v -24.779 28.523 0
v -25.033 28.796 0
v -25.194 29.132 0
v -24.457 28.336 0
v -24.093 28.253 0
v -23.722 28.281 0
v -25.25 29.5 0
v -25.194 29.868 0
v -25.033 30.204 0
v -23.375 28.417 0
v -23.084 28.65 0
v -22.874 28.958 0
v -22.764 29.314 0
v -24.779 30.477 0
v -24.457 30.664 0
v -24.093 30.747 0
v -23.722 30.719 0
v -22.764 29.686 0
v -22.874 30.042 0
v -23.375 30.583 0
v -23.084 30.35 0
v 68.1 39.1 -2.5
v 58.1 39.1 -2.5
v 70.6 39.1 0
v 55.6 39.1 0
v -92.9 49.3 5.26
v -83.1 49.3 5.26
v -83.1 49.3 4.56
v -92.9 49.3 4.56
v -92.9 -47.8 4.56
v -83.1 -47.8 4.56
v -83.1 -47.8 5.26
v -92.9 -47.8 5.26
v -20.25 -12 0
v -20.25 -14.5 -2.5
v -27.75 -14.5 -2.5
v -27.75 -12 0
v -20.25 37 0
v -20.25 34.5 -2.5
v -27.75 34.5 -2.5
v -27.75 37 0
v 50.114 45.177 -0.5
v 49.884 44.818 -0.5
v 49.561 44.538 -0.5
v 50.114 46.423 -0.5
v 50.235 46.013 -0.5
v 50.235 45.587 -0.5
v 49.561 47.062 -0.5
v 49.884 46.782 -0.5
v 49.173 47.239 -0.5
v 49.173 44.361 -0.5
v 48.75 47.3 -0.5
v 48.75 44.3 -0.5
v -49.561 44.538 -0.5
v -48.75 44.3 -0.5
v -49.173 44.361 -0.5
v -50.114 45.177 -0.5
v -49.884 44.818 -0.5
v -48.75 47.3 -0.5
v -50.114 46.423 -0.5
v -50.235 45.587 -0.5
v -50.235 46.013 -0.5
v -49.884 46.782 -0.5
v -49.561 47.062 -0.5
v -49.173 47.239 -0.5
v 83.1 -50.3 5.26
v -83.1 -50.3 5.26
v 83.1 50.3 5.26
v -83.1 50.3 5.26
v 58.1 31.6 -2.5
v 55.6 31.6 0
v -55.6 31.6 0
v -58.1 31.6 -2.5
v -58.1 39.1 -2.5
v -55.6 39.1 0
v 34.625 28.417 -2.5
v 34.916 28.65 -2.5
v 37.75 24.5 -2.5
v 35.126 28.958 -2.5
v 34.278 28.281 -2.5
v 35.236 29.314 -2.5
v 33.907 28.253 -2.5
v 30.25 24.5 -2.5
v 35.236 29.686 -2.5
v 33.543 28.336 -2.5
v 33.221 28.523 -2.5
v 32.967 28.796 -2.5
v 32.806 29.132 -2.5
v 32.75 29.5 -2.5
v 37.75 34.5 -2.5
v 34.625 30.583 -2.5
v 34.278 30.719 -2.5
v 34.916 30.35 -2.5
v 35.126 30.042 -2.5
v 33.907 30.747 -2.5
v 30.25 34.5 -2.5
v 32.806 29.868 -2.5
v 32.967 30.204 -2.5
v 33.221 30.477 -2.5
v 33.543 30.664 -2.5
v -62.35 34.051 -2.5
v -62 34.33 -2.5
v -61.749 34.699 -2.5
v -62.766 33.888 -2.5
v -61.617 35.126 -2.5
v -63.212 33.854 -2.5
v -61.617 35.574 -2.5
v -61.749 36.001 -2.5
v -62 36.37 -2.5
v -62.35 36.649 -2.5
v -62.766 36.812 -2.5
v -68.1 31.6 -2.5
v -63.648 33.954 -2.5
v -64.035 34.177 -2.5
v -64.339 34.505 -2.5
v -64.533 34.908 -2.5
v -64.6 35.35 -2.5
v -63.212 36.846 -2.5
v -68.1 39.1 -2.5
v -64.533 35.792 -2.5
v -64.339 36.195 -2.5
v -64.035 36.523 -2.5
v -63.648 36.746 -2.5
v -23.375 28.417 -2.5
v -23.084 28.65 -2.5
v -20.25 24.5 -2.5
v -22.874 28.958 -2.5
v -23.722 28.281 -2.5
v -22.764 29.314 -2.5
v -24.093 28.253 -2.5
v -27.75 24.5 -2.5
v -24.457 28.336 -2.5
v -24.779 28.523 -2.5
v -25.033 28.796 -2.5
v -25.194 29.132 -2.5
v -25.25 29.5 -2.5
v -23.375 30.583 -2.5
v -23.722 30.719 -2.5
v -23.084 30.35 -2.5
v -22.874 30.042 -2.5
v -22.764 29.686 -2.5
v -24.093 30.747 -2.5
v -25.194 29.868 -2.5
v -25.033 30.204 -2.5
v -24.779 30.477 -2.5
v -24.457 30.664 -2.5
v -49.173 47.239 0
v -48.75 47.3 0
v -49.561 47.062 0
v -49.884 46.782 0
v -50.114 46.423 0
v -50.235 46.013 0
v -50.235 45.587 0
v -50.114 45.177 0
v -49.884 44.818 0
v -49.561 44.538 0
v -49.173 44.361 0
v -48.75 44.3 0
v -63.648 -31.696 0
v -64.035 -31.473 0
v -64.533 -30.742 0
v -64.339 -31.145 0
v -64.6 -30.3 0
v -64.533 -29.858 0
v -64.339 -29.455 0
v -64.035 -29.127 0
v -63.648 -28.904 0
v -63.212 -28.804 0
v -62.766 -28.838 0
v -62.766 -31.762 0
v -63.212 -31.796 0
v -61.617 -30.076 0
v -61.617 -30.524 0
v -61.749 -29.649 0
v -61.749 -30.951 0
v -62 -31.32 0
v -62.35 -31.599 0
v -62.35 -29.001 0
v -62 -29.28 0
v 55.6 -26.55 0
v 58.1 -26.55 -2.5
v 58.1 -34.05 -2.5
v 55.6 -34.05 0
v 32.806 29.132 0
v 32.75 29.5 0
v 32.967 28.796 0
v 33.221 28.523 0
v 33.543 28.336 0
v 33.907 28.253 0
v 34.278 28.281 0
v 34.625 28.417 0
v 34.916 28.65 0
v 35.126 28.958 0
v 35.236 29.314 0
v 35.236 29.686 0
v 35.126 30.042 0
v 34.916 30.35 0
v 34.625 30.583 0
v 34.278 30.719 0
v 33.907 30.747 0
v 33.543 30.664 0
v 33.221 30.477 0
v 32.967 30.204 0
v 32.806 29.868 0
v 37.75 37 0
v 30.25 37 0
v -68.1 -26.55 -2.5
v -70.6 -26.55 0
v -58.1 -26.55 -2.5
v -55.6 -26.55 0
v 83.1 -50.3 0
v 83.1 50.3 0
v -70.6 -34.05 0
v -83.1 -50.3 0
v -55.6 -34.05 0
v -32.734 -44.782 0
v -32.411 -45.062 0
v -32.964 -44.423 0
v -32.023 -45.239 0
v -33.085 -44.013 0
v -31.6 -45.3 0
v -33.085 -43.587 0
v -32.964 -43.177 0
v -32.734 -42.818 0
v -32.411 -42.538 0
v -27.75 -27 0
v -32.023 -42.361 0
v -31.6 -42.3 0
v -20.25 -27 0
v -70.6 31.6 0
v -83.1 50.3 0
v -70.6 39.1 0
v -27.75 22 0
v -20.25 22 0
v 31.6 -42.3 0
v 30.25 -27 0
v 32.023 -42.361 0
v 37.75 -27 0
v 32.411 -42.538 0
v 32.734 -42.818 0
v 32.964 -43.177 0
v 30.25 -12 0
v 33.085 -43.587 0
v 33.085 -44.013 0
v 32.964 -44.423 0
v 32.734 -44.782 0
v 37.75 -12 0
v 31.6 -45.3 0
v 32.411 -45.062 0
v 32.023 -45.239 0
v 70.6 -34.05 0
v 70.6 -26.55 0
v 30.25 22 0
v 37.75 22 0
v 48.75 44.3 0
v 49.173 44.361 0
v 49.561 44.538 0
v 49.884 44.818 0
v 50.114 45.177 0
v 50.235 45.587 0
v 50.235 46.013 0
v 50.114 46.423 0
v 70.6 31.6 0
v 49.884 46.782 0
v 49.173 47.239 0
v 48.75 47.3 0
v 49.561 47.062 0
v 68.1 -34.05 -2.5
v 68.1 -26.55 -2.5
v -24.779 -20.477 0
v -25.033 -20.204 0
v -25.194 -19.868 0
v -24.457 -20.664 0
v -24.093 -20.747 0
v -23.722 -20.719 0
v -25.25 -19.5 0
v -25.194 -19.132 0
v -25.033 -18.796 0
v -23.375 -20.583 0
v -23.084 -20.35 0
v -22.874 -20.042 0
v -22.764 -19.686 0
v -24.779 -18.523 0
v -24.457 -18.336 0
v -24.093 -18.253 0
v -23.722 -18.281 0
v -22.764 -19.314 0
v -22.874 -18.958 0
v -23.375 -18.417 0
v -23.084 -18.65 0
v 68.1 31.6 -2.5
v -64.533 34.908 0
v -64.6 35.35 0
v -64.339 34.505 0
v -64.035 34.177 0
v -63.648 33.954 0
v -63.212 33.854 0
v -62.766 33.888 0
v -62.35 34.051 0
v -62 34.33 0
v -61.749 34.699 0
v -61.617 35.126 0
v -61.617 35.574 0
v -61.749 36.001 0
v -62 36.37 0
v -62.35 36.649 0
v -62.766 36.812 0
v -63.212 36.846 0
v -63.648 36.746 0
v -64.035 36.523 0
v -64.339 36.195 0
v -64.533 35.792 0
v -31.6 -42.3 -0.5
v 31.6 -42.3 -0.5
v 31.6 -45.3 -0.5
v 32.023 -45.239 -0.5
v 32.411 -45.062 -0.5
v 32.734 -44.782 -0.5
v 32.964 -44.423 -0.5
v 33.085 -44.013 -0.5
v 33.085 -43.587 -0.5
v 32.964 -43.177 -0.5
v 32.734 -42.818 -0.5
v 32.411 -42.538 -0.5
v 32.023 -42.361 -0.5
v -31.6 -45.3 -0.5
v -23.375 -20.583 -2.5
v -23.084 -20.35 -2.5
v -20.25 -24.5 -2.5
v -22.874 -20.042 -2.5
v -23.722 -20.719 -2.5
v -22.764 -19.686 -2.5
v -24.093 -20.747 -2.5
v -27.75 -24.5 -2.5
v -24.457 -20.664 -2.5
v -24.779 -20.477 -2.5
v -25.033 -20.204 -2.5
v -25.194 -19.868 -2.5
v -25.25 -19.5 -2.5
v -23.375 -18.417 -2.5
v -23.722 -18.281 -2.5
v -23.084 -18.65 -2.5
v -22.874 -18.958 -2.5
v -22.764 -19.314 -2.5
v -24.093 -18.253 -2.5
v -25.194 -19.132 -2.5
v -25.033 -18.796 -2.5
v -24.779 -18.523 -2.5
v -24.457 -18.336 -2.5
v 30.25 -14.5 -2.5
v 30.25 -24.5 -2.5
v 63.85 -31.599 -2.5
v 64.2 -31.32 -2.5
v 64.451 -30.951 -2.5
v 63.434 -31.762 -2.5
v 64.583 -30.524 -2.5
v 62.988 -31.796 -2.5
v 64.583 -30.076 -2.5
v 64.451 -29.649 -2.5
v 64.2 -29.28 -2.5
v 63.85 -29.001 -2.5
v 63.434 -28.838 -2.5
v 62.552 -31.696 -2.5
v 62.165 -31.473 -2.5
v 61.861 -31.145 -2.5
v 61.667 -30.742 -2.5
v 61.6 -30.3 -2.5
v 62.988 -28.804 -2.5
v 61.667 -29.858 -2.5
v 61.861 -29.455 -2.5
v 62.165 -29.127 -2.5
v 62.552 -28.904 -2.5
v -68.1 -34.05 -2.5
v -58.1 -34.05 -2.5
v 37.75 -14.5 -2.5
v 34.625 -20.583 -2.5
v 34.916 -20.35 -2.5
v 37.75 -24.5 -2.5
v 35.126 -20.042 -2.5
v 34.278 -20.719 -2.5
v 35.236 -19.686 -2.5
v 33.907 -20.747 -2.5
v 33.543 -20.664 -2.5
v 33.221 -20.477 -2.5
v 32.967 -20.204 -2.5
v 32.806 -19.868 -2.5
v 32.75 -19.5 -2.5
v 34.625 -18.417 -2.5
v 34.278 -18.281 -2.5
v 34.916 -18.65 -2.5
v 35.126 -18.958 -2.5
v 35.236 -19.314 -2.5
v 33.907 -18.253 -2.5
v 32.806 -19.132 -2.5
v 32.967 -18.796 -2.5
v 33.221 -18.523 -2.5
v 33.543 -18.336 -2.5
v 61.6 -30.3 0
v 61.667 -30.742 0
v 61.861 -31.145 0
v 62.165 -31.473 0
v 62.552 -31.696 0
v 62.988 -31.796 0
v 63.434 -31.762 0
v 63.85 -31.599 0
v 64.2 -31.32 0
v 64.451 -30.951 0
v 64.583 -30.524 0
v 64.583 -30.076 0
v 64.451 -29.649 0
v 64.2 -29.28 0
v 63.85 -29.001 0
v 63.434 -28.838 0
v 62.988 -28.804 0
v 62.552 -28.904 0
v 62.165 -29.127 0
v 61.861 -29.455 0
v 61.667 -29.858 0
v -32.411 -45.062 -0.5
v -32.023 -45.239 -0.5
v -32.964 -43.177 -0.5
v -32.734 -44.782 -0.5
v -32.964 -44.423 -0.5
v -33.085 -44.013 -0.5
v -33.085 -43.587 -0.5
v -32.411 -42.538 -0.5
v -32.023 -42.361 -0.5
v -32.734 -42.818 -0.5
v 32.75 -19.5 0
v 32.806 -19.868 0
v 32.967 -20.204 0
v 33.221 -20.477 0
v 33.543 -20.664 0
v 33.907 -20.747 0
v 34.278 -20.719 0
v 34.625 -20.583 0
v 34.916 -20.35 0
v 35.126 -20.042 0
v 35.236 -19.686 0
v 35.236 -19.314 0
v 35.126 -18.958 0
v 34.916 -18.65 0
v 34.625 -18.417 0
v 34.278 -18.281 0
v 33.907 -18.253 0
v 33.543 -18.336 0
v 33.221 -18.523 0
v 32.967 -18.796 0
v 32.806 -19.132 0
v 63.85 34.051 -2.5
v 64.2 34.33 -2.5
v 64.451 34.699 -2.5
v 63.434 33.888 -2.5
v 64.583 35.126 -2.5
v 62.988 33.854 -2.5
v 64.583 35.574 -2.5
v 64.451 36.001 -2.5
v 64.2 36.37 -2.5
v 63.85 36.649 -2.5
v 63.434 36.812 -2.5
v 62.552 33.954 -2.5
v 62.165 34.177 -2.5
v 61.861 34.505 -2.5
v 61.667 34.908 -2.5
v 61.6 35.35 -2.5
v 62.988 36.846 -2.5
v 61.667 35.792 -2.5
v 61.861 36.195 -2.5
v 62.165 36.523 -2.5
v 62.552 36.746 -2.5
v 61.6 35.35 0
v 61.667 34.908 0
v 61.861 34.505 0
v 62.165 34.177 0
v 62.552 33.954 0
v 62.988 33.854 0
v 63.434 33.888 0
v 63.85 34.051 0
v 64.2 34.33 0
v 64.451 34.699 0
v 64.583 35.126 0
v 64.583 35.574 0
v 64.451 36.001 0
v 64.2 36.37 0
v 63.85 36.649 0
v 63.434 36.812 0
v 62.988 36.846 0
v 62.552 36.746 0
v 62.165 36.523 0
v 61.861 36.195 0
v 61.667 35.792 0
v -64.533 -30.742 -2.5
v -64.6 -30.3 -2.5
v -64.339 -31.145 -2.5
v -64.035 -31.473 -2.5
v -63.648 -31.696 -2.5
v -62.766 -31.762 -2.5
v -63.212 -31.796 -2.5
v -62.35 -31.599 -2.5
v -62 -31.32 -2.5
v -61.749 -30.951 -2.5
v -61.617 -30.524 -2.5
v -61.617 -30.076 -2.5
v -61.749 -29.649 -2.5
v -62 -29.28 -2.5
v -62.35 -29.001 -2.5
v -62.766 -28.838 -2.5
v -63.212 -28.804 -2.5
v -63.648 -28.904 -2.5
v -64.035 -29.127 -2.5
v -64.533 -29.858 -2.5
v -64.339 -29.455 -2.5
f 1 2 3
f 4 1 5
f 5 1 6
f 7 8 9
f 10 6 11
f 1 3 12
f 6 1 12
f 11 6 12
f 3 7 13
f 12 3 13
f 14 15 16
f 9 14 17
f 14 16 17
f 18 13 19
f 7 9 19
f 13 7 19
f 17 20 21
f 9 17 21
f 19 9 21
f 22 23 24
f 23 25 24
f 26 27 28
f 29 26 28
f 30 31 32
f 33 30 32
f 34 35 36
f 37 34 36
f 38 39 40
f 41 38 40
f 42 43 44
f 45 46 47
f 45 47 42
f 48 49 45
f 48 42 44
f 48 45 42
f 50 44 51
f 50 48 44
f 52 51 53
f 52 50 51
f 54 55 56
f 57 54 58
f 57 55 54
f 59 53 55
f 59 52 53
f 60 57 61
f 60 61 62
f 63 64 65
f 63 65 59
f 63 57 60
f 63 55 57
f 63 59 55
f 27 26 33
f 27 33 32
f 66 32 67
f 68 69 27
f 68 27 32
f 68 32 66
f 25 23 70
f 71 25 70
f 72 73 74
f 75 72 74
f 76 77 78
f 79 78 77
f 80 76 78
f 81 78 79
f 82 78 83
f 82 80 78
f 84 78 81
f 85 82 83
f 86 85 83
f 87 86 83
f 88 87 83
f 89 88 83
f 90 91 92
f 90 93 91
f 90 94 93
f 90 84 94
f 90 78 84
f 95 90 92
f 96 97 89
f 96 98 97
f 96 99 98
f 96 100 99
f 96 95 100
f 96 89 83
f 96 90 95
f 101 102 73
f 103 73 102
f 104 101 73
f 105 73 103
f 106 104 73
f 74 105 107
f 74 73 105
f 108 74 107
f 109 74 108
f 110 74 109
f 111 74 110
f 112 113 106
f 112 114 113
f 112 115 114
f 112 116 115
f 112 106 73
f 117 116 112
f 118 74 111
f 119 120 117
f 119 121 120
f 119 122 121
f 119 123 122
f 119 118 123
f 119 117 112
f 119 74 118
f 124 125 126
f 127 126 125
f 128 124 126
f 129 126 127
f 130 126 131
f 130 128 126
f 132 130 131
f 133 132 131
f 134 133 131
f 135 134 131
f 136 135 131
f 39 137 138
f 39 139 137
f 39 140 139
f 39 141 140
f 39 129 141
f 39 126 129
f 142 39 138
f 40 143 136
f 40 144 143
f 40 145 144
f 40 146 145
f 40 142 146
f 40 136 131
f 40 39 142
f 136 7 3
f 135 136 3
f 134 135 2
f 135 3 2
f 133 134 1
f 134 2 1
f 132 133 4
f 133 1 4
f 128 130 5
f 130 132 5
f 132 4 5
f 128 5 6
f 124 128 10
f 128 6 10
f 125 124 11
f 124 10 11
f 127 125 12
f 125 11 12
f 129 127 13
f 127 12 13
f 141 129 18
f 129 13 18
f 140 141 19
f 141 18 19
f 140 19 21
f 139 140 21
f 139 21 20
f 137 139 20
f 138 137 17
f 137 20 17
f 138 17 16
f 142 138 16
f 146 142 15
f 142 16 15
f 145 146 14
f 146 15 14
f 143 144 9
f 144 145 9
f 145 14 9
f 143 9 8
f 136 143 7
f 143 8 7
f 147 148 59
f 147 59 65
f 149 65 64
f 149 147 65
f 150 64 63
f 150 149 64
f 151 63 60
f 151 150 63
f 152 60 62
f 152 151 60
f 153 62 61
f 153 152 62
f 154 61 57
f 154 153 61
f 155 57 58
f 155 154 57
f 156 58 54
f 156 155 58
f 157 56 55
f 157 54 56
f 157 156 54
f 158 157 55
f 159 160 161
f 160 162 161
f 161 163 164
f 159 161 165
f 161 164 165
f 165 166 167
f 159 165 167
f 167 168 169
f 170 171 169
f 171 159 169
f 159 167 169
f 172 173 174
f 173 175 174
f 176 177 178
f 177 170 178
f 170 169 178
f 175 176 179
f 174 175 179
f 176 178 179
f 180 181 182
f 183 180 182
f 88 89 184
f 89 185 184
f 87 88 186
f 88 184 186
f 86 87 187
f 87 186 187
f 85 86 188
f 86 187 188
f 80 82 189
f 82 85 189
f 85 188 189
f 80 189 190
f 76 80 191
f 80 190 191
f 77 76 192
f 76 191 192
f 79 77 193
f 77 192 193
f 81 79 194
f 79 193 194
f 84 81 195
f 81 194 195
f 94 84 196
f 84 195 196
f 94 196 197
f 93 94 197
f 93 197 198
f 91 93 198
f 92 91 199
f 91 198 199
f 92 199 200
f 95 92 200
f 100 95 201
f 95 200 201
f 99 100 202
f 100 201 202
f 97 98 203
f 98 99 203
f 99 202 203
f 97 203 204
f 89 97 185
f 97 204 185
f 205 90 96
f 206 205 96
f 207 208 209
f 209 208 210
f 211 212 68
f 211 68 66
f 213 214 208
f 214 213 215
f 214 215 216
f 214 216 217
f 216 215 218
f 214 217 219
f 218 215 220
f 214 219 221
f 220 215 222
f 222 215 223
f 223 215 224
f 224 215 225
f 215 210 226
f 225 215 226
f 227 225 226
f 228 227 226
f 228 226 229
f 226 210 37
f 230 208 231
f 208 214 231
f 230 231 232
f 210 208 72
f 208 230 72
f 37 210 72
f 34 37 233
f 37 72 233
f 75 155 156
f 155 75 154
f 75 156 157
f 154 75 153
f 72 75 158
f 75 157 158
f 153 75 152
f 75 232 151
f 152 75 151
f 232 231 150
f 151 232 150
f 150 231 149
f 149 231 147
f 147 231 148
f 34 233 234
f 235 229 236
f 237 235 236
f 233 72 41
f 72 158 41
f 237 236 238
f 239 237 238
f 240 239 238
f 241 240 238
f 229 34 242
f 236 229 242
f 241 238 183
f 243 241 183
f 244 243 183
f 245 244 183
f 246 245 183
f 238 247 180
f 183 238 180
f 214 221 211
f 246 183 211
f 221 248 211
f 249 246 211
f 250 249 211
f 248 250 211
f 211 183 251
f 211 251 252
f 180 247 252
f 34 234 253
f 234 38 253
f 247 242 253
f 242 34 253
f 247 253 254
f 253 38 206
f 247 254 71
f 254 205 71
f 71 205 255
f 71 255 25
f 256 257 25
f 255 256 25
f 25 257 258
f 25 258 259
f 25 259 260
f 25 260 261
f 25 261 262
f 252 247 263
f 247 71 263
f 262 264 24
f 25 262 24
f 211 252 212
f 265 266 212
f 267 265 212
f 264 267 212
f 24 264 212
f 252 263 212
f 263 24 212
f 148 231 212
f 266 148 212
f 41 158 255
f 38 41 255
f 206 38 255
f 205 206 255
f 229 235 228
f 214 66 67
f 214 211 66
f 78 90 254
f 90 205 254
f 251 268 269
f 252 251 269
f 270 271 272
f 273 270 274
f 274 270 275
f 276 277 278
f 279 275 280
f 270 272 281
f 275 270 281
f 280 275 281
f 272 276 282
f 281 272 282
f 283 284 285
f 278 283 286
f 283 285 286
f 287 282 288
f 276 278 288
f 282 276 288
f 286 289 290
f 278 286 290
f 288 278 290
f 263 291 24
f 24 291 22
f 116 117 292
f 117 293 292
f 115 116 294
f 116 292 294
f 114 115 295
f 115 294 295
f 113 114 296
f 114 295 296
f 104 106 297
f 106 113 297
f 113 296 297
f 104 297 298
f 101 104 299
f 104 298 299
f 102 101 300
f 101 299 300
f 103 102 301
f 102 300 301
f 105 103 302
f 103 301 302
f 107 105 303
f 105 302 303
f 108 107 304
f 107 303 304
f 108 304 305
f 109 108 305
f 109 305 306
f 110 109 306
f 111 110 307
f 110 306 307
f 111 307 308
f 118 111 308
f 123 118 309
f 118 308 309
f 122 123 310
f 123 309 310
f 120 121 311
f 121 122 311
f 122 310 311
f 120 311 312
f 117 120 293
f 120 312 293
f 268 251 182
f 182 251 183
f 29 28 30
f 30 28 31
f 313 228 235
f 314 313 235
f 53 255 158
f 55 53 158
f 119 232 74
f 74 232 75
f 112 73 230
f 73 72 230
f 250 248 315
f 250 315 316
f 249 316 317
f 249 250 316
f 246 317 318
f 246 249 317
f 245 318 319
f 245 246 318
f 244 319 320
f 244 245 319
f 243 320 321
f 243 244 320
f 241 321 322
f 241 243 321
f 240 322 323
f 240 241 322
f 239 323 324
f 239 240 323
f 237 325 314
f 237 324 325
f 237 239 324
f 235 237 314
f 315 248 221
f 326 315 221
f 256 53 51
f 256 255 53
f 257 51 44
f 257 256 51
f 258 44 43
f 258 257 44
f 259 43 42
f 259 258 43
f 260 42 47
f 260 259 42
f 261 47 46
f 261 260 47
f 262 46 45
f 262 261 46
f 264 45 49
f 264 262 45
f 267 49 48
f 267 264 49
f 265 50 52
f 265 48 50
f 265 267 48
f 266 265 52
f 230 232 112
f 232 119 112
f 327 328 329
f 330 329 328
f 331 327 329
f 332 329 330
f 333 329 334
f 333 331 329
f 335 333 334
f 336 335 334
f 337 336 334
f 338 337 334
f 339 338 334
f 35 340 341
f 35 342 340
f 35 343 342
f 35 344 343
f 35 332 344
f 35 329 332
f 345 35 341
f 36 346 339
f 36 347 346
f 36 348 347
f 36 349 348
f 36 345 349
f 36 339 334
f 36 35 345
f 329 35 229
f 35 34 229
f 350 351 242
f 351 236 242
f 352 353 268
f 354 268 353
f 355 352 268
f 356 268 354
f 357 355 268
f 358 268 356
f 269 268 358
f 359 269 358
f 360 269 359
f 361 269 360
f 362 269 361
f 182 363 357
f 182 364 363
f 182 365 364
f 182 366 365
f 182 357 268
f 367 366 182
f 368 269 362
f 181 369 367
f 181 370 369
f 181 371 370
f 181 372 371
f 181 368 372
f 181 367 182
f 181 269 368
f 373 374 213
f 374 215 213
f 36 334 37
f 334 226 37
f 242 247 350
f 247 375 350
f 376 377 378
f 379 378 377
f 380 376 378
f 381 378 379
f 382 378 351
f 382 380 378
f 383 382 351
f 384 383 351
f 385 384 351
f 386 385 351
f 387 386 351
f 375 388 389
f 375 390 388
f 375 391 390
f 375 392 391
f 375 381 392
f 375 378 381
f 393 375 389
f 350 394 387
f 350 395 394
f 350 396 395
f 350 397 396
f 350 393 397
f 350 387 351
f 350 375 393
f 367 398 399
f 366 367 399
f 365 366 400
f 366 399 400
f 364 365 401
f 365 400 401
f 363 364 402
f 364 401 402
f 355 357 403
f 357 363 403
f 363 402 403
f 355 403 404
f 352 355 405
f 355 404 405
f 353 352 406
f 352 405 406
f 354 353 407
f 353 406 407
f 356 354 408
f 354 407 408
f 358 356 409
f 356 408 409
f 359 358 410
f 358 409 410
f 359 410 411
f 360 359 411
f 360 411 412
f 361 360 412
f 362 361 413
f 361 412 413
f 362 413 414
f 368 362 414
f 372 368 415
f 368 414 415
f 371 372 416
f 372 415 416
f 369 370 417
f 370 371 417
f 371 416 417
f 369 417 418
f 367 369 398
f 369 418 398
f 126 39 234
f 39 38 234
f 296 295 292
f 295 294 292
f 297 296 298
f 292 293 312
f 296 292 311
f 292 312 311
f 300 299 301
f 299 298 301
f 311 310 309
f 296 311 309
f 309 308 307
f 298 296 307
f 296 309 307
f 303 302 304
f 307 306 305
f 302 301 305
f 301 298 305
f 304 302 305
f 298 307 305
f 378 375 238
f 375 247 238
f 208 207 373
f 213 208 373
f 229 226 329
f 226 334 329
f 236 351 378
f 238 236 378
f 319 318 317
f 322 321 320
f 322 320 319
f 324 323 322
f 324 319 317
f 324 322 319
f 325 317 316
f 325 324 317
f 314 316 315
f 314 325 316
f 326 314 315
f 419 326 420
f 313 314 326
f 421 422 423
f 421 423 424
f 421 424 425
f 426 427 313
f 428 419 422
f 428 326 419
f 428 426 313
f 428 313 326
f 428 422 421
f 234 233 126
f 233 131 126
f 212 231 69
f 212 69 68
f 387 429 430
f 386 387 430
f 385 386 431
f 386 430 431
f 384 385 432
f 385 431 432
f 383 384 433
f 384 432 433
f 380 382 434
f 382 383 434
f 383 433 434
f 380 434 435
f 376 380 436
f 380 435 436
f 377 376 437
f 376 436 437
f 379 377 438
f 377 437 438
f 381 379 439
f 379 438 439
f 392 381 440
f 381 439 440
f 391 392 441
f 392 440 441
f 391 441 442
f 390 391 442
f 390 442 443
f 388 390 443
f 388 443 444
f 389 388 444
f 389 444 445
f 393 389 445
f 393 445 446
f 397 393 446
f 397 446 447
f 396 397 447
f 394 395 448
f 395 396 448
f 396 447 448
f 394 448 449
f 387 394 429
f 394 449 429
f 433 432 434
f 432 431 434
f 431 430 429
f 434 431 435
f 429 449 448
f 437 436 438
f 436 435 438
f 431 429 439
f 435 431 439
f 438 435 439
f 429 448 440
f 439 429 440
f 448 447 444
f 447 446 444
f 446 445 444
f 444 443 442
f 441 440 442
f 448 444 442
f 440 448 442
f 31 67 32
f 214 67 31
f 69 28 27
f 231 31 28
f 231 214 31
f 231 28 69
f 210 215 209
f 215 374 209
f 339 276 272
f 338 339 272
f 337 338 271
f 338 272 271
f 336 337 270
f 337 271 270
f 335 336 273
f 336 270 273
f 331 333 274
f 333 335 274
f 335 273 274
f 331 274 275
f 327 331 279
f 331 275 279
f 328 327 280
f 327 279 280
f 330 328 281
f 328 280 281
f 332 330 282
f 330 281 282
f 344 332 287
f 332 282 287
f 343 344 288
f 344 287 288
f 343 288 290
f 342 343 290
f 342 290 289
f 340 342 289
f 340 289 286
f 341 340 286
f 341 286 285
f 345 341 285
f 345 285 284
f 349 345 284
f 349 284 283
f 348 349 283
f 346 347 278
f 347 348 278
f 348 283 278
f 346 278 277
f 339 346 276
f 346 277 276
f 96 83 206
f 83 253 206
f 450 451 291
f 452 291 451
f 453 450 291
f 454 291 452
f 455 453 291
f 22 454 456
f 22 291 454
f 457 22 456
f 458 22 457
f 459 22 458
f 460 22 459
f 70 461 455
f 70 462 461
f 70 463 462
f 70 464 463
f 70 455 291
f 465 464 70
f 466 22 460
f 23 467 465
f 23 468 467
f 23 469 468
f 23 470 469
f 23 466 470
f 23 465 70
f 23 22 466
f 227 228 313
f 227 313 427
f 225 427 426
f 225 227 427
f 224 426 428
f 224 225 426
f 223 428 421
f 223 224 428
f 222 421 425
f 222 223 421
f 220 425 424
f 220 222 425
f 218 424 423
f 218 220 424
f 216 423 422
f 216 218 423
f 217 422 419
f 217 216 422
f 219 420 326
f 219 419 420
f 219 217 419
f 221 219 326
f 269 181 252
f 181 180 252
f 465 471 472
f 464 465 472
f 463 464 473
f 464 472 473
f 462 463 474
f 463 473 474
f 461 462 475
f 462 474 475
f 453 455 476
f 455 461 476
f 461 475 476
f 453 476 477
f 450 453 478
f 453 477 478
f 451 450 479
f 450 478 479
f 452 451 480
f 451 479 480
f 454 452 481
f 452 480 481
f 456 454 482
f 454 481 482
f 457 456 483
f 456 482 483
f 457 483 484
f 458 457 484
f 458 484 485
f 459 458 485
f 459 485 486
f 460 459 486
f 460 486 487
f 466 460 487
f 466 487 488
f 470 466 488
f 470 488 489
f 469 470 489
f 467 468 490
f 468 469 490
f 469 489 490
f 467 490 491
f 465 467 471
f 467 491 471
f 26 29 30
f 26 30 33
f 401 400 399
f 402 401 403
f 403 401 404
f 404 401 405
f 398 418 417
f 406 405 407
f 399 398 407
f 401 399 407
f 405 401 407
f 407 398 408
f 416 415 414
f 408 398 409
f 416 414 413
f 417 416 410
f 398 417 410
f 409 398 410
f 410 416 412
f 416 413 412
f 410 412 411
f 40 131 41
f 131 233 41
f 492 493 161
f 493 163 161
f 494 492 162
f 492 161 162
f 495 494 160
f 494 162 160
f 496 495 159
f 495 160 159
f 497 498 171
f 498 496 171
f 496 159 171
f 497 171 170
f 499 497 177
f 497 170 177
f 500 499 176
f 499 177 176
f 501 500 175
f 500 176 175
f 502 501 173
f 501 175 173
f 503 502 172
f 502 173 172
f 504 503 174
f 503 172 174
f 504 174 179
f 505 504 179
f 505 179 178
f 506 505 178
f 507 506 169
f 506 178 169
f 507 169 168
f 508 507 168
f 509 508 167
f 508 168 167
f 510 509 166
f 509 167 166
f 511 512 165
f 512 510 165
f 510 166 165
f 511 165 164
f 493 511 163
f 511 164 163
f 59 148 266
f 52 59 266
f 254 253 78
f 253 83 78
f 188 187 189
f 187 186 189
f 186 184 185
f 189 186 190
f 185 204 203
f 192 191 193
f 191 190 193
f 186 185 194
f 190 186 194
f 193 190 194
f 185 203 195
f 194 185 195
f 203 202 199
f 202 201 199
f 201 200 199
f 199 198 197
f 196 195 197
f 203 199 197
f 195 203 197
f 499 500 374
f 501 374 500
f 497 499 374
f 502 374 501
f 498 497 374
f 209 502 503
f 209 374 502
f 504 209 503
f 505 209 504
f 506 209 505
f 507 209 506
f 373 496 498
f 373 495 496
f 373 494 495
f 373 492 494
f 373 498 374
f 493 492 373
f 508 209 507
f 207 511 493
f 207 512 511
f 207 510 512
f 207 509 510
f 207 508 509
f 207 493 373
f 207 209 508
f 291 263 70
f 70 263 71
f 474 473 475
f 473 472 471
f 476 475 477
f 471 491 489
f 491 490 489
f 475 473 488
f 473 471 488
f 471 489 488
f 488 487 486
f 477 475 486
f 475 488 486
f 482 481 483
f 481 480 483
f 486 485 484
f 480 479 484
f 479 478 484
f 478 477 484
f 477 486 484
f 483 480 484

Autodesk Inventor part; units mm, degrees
ref_plane "YZ Plane" through (0, 0, 0) normal (1, 0, 0) x (0, 1, 0)
ref_plane "XZ Plane" through (0, 0, 0) normal (0, 1, 0) x (-1, 0, 0)
ref_plane "XY Plane" through (0, 0, 0) normal (0, 0, 1) x (1, 0, 0)
sketch "Skizze1" plane through (0, 0, 0) normal (0, 0, 1) x (1, 0, 0)
  line L0 (-83.1, 50.3) -> (83.1, 50.3)
  line L1 (83.1, 50.3) -> (83.1, -50.3)
  line L2 (83.1, -50.3) -> (-83.1, -50.3)
  line L3 (-83.1, -50.3) -> (-83.1, 50.3)
  point P0 (0, 0)
  point P1 (83.1, 0)
  point P2 (0, 50.3)
  dimension "d0" = 166.2
  dimension "d1" = 100.6
extrude "Extrusion1" add sketch "Skizze1" along normal blind 5.26
sketch "Skizze2" plane through (0, 0, 0) normal (0, 0, -1) x (-1, 0, 0)
  line L0 (-83.1, 50.3) -> (-83.1, -50.3) projected
  line L1 (83.1, -50.3) -> (83.1, 50.3) projected
  line L2 (83.1, 50.3) -> (-83.1, 50.3) projected
  line L3 (-70.6, 31.6) -> (-55.6, 31.6)
  line L4 (-55.6, 31.6) -> (-55.6, 39.1)
  line L5 (-55.6, 39.1) -> (-70.6, 39.1)
  line L6 (-70.6, 39.1) -> (-70.6, 31.6)
  line L7 (-70.6, 31.6) -> (-55.6, 39.1) construction
  line L8 (-55.6, 31.6) -> (-70.6, 39.1) construction
  circle A0 centre (-63.1, 35.35) radius 1.5
  line L9 (55.6, 31.6) -> (70.6, 31.6)
  line L10 (70.6, 31.6) -> (70.6, 39.1)
  line L11 (70.6, 39.1) -> (55.6, 39.1)
  line L12 (55.6, 39.1) -> (55.6, 31.6)
  line L13 (55.6, 31.6) -> (70.6, 39.1) construction
  line L14 (70.6, 31.6) -> (55.6, 39.1) construction
  circle A1 centre (63.1, 35.35) radius 1.5
  line L15 (-55.6, -34.05) -> (-55.6, -26.55)
  circle A2 centre (-63.1, -30.3) radius 1.5
  line L16 (-70.6, -34.05) -> (-55.6, -34.05)
  line L17 (-70.6, -34.05) -> (-55.6, -26.55) construction
  line L18 (-55.6, -34.05) -> (-70.6, -26.55) construction
  line L19 (-55.6, -26.55) -> (-70.6, -26.55)
  line L20 (-70.6, -26.55) -> (-70.6, -34.05)
  line L21 (55.6, -26.55) -> (55.6, -34.05)
  circle A3 centre (63.1, -30.3) radius 1.5
  line L22 (70.6, -34.05) -> (70.6, -26.55)
  line L23 (70.6, -26.55) -> (55.6, -26.55)
  line L24 (55.6, -34.05) -> (70.6, -26.55) construction
  line L25 (70.6, -34.05) -> (55.6, -26.55) construction
  line L26 (55.6, -34.05) -> (70.6, -34.05)
  point P0 (0, 0)
  point P1 (63.1, 35.35)
  point P2 (-63.1, -30.3)
  point P3 (63.1, -30.3)
  point P4 (63.1, -30.3)
  dimension "d4" = 20
  dimension "d7" = 126.2
  dimension "d9" = 14.95
  dimension "d10" = 65.65
  dimension "d11" = 15
  dimension "d12" = 7.5
  dimension "d19" = 3
  dimension "d50" = 126.2
  dimension "d57" = 65.65
extrude "Extrusion2" add sketch "Skizze2" along normal blind 2.5
sketch "Skizze3" plane through (0, 0, 0) normal (0, 0, -1) x (-1, 0, 0)
  line L0 (-82.45, 50.3) -> (82.45, 50.3)
  line L1 (82.45, 50.3) -> (82.45, -50.3)
  line L2 (82.45, -50.3) -> (-82.45, -50.3)
  line L3 (-82.45, -50.3) -> (-82.45, 50.3)
  line L4 (-37.75, 22) -> (-30.25, 22)
  line L5 (-30.25, 22) -> (-30.25, 37)
  line L6 (-30.25, 37) -> (-37.75, 37)
  line L7 (-37.75, 37) -> (-37.75, 22)
  line L8 (-37.75, 22) -> (-30.25, 37) construction
  line L9 (-30.25, 22) -> (-37.75, 37) construction
  circle A0 centre (-34, 29.5) radius 1.25
  line L10 (20.25, 22) -> (27.75, 22)
  line L11 (27.75, 22) -> (27.75, 37)
  line L12 (27.75, 37) -> (20.25, 37)
  line L13 (20.25, 37) -> (20.25, 22)
  line L14 (20.25, 22) -> (27.75, 37) construction
  line L15 (27.75, 22) -> (20.25, 37) construction
  circle A1 centre (24, 29.5) radius 1.25
  line L16 (-37.75, -27) -> (-30.25, -27)
  line L17 (-30.25, -27) -> (-30.25, -12)
  line L18 (-30.25, -12) -> (-37.75, -12)
  line L19 (-37.75, -12) -> (-37.75, -27)
  line L20 (-37.75, -27) -> (-30.25, -12) construction
  line L21 (-30.25, -27) -> (-37.75, -12) construction
  circle A2 centre (-34, -19.5) radius 1.25
  line L22 (20.25, -27) -> (27.75, -27)
  line L23 (27.75, -27) -> (27.75, -12)
  line L24 (27.75, -12) -> (20.25, -12)
  line L25 (20.25, -12) -> (20.25, -27)
  line L26 (20.25, -27) -> (27.75, -12) construction
  line L27 (27.75, -27) -> (20.25, -12) construction
  circle A3 centre (24, -19.5) radius 1.25
  point P0 (0, 0)
  point P1 (-82.45, 0)
  point P2 (0, 50.3)
  point P3 (-34, -19.5)
  point P4 (24, -19.5)
  dimension "d25" = 164.9
  dimension "d26" = 100.6
  dimension "d27" = 48.45
  dimension "d28" = 58
  dimension "d29" = 20.8
  dimension "d30" = 49
  dimension "d31" = 7.5
  dimension "d32" = 15
  dimension "d33" = 2.5
  dimension "d64" = 58
  dimension "d67" = 49
extrude "Extrusion3" add sketch "Skizze3" along normal blind 2.5 contours L7 L6 L5 L4 | L13 L12 L11 L10 | L19 L18 L17 L16 | L25 L24 L23 L22
chamfer "Fase1" distance 2.5 angle 45 16 edges at (70.6, 35.35, -2.5) (55.6, 35.35, -2.5) (34, 22, -2.5) (34, 37, -2.5) (70.6, -30.3, -2.5) (55.6, -30.3, -2.5) (-55.6, -30.3, -2.5) (-70.6, -30.3, -2.5) (-70.6, 35.35, -2.5) (-55.6, 35.35, -2.5) (34, -12, -2.5) (34, -27, -2.5) (-24, -12, -2.5) (-24, -27, -2.5) (-24, 22, -2.5) (-24, 37, -2.5)
sketch "Skizze4" plane through (0, 0, 0) normal (0, 0, -1) x (-1, 0, 0)
  line L0 (-50.25, 45.8) -> (50.25, 45.8) construction
  line L1 (-48.75, 44.3) -> (48.75, 44.3)
  line L2 (48.75, 47.3) -> (-48.75, 47.3)
  arc A0 (-48.75, 47.3) -> (-48.75, 44.3) centre (-48.75, 45.8) ccw
  arc A1 (48.75, 44.3) -> (48.75, 47.3) centre (48.75, 45.8) ccw
  line L3 (-83.1, 50.3) -> (-83.1, -50.3) projected
  line L4 (83.1, 50.3) -> (-83.1, 50.3) projected
  line L5 (-33.1, -43.8) -> (33.1, -43.8) construction
  line L6 (-31.6, -45.3) -> (31.6, -45.3)
  line L7 (31.6, -42.3) -> (-31.6, -42.3)
  arc A2 (-31.6, -42.3) -> (-31.6, -45.3) centre (-31.6, -43.8) ccw
  arc A3 (31.6, -45.3) -> (31.6, -42.3) centre (31.6, -43.8) ccw
  line L8 (-83.1, -50.3) -> (83.1, -50.3) projected
  line L9 (83.1, -50.3) -> (83.1, 50.3) projected
  point P0 (0, 0)
  point P1 (0, 45.8)
  point P2 (0, -43.8)
  dimension "d70" = 100.5
  dimension "d71" = 3
  dimension "d73" = 3
  dimension "d74" = 3
  dimension "d75" = 5
  dimension "d76" = 50
  dimension "d77" = 50
extrude "Extrusion4" add sketch "Skizze4" along normal blind 0.5 contours A0 L2 A1 L1 | A2 L7 A3 L6
sketch "Skizze6" plane through (-83.1, -50.3, 0) normal (-1, 0, 0) x (0, 0, 1)
  line L0 (5.26, 100.6) -> (5.26, 0) projected
  line L1 (5.26, 99.6) -> (4.56, 99.6)
  line L2 (4.56, 99.6) -> (4.56, 2.5)
  line L3 (4.56, 2.5) -> (5.26, 2.5)
  line L4 (5.26, 2.5) -> (5.26, 99.6)
  line L5 (0, 0) -> (5.26, 0) projected
  line L6 (0, 100.6) -> (5.26, 100.6) projected
  point P0 (0, 50.3)
  dimension "d83" = 0.7
  dimension "d84" = 2.5
  dimension "d85" = 1
extrude "Extrusion6" add sketch "Skizze6" along normal blind 9.8
equation "\"d77\" = d76"
properties part number "Display Controller" material "Stahl, galvanisiert"
